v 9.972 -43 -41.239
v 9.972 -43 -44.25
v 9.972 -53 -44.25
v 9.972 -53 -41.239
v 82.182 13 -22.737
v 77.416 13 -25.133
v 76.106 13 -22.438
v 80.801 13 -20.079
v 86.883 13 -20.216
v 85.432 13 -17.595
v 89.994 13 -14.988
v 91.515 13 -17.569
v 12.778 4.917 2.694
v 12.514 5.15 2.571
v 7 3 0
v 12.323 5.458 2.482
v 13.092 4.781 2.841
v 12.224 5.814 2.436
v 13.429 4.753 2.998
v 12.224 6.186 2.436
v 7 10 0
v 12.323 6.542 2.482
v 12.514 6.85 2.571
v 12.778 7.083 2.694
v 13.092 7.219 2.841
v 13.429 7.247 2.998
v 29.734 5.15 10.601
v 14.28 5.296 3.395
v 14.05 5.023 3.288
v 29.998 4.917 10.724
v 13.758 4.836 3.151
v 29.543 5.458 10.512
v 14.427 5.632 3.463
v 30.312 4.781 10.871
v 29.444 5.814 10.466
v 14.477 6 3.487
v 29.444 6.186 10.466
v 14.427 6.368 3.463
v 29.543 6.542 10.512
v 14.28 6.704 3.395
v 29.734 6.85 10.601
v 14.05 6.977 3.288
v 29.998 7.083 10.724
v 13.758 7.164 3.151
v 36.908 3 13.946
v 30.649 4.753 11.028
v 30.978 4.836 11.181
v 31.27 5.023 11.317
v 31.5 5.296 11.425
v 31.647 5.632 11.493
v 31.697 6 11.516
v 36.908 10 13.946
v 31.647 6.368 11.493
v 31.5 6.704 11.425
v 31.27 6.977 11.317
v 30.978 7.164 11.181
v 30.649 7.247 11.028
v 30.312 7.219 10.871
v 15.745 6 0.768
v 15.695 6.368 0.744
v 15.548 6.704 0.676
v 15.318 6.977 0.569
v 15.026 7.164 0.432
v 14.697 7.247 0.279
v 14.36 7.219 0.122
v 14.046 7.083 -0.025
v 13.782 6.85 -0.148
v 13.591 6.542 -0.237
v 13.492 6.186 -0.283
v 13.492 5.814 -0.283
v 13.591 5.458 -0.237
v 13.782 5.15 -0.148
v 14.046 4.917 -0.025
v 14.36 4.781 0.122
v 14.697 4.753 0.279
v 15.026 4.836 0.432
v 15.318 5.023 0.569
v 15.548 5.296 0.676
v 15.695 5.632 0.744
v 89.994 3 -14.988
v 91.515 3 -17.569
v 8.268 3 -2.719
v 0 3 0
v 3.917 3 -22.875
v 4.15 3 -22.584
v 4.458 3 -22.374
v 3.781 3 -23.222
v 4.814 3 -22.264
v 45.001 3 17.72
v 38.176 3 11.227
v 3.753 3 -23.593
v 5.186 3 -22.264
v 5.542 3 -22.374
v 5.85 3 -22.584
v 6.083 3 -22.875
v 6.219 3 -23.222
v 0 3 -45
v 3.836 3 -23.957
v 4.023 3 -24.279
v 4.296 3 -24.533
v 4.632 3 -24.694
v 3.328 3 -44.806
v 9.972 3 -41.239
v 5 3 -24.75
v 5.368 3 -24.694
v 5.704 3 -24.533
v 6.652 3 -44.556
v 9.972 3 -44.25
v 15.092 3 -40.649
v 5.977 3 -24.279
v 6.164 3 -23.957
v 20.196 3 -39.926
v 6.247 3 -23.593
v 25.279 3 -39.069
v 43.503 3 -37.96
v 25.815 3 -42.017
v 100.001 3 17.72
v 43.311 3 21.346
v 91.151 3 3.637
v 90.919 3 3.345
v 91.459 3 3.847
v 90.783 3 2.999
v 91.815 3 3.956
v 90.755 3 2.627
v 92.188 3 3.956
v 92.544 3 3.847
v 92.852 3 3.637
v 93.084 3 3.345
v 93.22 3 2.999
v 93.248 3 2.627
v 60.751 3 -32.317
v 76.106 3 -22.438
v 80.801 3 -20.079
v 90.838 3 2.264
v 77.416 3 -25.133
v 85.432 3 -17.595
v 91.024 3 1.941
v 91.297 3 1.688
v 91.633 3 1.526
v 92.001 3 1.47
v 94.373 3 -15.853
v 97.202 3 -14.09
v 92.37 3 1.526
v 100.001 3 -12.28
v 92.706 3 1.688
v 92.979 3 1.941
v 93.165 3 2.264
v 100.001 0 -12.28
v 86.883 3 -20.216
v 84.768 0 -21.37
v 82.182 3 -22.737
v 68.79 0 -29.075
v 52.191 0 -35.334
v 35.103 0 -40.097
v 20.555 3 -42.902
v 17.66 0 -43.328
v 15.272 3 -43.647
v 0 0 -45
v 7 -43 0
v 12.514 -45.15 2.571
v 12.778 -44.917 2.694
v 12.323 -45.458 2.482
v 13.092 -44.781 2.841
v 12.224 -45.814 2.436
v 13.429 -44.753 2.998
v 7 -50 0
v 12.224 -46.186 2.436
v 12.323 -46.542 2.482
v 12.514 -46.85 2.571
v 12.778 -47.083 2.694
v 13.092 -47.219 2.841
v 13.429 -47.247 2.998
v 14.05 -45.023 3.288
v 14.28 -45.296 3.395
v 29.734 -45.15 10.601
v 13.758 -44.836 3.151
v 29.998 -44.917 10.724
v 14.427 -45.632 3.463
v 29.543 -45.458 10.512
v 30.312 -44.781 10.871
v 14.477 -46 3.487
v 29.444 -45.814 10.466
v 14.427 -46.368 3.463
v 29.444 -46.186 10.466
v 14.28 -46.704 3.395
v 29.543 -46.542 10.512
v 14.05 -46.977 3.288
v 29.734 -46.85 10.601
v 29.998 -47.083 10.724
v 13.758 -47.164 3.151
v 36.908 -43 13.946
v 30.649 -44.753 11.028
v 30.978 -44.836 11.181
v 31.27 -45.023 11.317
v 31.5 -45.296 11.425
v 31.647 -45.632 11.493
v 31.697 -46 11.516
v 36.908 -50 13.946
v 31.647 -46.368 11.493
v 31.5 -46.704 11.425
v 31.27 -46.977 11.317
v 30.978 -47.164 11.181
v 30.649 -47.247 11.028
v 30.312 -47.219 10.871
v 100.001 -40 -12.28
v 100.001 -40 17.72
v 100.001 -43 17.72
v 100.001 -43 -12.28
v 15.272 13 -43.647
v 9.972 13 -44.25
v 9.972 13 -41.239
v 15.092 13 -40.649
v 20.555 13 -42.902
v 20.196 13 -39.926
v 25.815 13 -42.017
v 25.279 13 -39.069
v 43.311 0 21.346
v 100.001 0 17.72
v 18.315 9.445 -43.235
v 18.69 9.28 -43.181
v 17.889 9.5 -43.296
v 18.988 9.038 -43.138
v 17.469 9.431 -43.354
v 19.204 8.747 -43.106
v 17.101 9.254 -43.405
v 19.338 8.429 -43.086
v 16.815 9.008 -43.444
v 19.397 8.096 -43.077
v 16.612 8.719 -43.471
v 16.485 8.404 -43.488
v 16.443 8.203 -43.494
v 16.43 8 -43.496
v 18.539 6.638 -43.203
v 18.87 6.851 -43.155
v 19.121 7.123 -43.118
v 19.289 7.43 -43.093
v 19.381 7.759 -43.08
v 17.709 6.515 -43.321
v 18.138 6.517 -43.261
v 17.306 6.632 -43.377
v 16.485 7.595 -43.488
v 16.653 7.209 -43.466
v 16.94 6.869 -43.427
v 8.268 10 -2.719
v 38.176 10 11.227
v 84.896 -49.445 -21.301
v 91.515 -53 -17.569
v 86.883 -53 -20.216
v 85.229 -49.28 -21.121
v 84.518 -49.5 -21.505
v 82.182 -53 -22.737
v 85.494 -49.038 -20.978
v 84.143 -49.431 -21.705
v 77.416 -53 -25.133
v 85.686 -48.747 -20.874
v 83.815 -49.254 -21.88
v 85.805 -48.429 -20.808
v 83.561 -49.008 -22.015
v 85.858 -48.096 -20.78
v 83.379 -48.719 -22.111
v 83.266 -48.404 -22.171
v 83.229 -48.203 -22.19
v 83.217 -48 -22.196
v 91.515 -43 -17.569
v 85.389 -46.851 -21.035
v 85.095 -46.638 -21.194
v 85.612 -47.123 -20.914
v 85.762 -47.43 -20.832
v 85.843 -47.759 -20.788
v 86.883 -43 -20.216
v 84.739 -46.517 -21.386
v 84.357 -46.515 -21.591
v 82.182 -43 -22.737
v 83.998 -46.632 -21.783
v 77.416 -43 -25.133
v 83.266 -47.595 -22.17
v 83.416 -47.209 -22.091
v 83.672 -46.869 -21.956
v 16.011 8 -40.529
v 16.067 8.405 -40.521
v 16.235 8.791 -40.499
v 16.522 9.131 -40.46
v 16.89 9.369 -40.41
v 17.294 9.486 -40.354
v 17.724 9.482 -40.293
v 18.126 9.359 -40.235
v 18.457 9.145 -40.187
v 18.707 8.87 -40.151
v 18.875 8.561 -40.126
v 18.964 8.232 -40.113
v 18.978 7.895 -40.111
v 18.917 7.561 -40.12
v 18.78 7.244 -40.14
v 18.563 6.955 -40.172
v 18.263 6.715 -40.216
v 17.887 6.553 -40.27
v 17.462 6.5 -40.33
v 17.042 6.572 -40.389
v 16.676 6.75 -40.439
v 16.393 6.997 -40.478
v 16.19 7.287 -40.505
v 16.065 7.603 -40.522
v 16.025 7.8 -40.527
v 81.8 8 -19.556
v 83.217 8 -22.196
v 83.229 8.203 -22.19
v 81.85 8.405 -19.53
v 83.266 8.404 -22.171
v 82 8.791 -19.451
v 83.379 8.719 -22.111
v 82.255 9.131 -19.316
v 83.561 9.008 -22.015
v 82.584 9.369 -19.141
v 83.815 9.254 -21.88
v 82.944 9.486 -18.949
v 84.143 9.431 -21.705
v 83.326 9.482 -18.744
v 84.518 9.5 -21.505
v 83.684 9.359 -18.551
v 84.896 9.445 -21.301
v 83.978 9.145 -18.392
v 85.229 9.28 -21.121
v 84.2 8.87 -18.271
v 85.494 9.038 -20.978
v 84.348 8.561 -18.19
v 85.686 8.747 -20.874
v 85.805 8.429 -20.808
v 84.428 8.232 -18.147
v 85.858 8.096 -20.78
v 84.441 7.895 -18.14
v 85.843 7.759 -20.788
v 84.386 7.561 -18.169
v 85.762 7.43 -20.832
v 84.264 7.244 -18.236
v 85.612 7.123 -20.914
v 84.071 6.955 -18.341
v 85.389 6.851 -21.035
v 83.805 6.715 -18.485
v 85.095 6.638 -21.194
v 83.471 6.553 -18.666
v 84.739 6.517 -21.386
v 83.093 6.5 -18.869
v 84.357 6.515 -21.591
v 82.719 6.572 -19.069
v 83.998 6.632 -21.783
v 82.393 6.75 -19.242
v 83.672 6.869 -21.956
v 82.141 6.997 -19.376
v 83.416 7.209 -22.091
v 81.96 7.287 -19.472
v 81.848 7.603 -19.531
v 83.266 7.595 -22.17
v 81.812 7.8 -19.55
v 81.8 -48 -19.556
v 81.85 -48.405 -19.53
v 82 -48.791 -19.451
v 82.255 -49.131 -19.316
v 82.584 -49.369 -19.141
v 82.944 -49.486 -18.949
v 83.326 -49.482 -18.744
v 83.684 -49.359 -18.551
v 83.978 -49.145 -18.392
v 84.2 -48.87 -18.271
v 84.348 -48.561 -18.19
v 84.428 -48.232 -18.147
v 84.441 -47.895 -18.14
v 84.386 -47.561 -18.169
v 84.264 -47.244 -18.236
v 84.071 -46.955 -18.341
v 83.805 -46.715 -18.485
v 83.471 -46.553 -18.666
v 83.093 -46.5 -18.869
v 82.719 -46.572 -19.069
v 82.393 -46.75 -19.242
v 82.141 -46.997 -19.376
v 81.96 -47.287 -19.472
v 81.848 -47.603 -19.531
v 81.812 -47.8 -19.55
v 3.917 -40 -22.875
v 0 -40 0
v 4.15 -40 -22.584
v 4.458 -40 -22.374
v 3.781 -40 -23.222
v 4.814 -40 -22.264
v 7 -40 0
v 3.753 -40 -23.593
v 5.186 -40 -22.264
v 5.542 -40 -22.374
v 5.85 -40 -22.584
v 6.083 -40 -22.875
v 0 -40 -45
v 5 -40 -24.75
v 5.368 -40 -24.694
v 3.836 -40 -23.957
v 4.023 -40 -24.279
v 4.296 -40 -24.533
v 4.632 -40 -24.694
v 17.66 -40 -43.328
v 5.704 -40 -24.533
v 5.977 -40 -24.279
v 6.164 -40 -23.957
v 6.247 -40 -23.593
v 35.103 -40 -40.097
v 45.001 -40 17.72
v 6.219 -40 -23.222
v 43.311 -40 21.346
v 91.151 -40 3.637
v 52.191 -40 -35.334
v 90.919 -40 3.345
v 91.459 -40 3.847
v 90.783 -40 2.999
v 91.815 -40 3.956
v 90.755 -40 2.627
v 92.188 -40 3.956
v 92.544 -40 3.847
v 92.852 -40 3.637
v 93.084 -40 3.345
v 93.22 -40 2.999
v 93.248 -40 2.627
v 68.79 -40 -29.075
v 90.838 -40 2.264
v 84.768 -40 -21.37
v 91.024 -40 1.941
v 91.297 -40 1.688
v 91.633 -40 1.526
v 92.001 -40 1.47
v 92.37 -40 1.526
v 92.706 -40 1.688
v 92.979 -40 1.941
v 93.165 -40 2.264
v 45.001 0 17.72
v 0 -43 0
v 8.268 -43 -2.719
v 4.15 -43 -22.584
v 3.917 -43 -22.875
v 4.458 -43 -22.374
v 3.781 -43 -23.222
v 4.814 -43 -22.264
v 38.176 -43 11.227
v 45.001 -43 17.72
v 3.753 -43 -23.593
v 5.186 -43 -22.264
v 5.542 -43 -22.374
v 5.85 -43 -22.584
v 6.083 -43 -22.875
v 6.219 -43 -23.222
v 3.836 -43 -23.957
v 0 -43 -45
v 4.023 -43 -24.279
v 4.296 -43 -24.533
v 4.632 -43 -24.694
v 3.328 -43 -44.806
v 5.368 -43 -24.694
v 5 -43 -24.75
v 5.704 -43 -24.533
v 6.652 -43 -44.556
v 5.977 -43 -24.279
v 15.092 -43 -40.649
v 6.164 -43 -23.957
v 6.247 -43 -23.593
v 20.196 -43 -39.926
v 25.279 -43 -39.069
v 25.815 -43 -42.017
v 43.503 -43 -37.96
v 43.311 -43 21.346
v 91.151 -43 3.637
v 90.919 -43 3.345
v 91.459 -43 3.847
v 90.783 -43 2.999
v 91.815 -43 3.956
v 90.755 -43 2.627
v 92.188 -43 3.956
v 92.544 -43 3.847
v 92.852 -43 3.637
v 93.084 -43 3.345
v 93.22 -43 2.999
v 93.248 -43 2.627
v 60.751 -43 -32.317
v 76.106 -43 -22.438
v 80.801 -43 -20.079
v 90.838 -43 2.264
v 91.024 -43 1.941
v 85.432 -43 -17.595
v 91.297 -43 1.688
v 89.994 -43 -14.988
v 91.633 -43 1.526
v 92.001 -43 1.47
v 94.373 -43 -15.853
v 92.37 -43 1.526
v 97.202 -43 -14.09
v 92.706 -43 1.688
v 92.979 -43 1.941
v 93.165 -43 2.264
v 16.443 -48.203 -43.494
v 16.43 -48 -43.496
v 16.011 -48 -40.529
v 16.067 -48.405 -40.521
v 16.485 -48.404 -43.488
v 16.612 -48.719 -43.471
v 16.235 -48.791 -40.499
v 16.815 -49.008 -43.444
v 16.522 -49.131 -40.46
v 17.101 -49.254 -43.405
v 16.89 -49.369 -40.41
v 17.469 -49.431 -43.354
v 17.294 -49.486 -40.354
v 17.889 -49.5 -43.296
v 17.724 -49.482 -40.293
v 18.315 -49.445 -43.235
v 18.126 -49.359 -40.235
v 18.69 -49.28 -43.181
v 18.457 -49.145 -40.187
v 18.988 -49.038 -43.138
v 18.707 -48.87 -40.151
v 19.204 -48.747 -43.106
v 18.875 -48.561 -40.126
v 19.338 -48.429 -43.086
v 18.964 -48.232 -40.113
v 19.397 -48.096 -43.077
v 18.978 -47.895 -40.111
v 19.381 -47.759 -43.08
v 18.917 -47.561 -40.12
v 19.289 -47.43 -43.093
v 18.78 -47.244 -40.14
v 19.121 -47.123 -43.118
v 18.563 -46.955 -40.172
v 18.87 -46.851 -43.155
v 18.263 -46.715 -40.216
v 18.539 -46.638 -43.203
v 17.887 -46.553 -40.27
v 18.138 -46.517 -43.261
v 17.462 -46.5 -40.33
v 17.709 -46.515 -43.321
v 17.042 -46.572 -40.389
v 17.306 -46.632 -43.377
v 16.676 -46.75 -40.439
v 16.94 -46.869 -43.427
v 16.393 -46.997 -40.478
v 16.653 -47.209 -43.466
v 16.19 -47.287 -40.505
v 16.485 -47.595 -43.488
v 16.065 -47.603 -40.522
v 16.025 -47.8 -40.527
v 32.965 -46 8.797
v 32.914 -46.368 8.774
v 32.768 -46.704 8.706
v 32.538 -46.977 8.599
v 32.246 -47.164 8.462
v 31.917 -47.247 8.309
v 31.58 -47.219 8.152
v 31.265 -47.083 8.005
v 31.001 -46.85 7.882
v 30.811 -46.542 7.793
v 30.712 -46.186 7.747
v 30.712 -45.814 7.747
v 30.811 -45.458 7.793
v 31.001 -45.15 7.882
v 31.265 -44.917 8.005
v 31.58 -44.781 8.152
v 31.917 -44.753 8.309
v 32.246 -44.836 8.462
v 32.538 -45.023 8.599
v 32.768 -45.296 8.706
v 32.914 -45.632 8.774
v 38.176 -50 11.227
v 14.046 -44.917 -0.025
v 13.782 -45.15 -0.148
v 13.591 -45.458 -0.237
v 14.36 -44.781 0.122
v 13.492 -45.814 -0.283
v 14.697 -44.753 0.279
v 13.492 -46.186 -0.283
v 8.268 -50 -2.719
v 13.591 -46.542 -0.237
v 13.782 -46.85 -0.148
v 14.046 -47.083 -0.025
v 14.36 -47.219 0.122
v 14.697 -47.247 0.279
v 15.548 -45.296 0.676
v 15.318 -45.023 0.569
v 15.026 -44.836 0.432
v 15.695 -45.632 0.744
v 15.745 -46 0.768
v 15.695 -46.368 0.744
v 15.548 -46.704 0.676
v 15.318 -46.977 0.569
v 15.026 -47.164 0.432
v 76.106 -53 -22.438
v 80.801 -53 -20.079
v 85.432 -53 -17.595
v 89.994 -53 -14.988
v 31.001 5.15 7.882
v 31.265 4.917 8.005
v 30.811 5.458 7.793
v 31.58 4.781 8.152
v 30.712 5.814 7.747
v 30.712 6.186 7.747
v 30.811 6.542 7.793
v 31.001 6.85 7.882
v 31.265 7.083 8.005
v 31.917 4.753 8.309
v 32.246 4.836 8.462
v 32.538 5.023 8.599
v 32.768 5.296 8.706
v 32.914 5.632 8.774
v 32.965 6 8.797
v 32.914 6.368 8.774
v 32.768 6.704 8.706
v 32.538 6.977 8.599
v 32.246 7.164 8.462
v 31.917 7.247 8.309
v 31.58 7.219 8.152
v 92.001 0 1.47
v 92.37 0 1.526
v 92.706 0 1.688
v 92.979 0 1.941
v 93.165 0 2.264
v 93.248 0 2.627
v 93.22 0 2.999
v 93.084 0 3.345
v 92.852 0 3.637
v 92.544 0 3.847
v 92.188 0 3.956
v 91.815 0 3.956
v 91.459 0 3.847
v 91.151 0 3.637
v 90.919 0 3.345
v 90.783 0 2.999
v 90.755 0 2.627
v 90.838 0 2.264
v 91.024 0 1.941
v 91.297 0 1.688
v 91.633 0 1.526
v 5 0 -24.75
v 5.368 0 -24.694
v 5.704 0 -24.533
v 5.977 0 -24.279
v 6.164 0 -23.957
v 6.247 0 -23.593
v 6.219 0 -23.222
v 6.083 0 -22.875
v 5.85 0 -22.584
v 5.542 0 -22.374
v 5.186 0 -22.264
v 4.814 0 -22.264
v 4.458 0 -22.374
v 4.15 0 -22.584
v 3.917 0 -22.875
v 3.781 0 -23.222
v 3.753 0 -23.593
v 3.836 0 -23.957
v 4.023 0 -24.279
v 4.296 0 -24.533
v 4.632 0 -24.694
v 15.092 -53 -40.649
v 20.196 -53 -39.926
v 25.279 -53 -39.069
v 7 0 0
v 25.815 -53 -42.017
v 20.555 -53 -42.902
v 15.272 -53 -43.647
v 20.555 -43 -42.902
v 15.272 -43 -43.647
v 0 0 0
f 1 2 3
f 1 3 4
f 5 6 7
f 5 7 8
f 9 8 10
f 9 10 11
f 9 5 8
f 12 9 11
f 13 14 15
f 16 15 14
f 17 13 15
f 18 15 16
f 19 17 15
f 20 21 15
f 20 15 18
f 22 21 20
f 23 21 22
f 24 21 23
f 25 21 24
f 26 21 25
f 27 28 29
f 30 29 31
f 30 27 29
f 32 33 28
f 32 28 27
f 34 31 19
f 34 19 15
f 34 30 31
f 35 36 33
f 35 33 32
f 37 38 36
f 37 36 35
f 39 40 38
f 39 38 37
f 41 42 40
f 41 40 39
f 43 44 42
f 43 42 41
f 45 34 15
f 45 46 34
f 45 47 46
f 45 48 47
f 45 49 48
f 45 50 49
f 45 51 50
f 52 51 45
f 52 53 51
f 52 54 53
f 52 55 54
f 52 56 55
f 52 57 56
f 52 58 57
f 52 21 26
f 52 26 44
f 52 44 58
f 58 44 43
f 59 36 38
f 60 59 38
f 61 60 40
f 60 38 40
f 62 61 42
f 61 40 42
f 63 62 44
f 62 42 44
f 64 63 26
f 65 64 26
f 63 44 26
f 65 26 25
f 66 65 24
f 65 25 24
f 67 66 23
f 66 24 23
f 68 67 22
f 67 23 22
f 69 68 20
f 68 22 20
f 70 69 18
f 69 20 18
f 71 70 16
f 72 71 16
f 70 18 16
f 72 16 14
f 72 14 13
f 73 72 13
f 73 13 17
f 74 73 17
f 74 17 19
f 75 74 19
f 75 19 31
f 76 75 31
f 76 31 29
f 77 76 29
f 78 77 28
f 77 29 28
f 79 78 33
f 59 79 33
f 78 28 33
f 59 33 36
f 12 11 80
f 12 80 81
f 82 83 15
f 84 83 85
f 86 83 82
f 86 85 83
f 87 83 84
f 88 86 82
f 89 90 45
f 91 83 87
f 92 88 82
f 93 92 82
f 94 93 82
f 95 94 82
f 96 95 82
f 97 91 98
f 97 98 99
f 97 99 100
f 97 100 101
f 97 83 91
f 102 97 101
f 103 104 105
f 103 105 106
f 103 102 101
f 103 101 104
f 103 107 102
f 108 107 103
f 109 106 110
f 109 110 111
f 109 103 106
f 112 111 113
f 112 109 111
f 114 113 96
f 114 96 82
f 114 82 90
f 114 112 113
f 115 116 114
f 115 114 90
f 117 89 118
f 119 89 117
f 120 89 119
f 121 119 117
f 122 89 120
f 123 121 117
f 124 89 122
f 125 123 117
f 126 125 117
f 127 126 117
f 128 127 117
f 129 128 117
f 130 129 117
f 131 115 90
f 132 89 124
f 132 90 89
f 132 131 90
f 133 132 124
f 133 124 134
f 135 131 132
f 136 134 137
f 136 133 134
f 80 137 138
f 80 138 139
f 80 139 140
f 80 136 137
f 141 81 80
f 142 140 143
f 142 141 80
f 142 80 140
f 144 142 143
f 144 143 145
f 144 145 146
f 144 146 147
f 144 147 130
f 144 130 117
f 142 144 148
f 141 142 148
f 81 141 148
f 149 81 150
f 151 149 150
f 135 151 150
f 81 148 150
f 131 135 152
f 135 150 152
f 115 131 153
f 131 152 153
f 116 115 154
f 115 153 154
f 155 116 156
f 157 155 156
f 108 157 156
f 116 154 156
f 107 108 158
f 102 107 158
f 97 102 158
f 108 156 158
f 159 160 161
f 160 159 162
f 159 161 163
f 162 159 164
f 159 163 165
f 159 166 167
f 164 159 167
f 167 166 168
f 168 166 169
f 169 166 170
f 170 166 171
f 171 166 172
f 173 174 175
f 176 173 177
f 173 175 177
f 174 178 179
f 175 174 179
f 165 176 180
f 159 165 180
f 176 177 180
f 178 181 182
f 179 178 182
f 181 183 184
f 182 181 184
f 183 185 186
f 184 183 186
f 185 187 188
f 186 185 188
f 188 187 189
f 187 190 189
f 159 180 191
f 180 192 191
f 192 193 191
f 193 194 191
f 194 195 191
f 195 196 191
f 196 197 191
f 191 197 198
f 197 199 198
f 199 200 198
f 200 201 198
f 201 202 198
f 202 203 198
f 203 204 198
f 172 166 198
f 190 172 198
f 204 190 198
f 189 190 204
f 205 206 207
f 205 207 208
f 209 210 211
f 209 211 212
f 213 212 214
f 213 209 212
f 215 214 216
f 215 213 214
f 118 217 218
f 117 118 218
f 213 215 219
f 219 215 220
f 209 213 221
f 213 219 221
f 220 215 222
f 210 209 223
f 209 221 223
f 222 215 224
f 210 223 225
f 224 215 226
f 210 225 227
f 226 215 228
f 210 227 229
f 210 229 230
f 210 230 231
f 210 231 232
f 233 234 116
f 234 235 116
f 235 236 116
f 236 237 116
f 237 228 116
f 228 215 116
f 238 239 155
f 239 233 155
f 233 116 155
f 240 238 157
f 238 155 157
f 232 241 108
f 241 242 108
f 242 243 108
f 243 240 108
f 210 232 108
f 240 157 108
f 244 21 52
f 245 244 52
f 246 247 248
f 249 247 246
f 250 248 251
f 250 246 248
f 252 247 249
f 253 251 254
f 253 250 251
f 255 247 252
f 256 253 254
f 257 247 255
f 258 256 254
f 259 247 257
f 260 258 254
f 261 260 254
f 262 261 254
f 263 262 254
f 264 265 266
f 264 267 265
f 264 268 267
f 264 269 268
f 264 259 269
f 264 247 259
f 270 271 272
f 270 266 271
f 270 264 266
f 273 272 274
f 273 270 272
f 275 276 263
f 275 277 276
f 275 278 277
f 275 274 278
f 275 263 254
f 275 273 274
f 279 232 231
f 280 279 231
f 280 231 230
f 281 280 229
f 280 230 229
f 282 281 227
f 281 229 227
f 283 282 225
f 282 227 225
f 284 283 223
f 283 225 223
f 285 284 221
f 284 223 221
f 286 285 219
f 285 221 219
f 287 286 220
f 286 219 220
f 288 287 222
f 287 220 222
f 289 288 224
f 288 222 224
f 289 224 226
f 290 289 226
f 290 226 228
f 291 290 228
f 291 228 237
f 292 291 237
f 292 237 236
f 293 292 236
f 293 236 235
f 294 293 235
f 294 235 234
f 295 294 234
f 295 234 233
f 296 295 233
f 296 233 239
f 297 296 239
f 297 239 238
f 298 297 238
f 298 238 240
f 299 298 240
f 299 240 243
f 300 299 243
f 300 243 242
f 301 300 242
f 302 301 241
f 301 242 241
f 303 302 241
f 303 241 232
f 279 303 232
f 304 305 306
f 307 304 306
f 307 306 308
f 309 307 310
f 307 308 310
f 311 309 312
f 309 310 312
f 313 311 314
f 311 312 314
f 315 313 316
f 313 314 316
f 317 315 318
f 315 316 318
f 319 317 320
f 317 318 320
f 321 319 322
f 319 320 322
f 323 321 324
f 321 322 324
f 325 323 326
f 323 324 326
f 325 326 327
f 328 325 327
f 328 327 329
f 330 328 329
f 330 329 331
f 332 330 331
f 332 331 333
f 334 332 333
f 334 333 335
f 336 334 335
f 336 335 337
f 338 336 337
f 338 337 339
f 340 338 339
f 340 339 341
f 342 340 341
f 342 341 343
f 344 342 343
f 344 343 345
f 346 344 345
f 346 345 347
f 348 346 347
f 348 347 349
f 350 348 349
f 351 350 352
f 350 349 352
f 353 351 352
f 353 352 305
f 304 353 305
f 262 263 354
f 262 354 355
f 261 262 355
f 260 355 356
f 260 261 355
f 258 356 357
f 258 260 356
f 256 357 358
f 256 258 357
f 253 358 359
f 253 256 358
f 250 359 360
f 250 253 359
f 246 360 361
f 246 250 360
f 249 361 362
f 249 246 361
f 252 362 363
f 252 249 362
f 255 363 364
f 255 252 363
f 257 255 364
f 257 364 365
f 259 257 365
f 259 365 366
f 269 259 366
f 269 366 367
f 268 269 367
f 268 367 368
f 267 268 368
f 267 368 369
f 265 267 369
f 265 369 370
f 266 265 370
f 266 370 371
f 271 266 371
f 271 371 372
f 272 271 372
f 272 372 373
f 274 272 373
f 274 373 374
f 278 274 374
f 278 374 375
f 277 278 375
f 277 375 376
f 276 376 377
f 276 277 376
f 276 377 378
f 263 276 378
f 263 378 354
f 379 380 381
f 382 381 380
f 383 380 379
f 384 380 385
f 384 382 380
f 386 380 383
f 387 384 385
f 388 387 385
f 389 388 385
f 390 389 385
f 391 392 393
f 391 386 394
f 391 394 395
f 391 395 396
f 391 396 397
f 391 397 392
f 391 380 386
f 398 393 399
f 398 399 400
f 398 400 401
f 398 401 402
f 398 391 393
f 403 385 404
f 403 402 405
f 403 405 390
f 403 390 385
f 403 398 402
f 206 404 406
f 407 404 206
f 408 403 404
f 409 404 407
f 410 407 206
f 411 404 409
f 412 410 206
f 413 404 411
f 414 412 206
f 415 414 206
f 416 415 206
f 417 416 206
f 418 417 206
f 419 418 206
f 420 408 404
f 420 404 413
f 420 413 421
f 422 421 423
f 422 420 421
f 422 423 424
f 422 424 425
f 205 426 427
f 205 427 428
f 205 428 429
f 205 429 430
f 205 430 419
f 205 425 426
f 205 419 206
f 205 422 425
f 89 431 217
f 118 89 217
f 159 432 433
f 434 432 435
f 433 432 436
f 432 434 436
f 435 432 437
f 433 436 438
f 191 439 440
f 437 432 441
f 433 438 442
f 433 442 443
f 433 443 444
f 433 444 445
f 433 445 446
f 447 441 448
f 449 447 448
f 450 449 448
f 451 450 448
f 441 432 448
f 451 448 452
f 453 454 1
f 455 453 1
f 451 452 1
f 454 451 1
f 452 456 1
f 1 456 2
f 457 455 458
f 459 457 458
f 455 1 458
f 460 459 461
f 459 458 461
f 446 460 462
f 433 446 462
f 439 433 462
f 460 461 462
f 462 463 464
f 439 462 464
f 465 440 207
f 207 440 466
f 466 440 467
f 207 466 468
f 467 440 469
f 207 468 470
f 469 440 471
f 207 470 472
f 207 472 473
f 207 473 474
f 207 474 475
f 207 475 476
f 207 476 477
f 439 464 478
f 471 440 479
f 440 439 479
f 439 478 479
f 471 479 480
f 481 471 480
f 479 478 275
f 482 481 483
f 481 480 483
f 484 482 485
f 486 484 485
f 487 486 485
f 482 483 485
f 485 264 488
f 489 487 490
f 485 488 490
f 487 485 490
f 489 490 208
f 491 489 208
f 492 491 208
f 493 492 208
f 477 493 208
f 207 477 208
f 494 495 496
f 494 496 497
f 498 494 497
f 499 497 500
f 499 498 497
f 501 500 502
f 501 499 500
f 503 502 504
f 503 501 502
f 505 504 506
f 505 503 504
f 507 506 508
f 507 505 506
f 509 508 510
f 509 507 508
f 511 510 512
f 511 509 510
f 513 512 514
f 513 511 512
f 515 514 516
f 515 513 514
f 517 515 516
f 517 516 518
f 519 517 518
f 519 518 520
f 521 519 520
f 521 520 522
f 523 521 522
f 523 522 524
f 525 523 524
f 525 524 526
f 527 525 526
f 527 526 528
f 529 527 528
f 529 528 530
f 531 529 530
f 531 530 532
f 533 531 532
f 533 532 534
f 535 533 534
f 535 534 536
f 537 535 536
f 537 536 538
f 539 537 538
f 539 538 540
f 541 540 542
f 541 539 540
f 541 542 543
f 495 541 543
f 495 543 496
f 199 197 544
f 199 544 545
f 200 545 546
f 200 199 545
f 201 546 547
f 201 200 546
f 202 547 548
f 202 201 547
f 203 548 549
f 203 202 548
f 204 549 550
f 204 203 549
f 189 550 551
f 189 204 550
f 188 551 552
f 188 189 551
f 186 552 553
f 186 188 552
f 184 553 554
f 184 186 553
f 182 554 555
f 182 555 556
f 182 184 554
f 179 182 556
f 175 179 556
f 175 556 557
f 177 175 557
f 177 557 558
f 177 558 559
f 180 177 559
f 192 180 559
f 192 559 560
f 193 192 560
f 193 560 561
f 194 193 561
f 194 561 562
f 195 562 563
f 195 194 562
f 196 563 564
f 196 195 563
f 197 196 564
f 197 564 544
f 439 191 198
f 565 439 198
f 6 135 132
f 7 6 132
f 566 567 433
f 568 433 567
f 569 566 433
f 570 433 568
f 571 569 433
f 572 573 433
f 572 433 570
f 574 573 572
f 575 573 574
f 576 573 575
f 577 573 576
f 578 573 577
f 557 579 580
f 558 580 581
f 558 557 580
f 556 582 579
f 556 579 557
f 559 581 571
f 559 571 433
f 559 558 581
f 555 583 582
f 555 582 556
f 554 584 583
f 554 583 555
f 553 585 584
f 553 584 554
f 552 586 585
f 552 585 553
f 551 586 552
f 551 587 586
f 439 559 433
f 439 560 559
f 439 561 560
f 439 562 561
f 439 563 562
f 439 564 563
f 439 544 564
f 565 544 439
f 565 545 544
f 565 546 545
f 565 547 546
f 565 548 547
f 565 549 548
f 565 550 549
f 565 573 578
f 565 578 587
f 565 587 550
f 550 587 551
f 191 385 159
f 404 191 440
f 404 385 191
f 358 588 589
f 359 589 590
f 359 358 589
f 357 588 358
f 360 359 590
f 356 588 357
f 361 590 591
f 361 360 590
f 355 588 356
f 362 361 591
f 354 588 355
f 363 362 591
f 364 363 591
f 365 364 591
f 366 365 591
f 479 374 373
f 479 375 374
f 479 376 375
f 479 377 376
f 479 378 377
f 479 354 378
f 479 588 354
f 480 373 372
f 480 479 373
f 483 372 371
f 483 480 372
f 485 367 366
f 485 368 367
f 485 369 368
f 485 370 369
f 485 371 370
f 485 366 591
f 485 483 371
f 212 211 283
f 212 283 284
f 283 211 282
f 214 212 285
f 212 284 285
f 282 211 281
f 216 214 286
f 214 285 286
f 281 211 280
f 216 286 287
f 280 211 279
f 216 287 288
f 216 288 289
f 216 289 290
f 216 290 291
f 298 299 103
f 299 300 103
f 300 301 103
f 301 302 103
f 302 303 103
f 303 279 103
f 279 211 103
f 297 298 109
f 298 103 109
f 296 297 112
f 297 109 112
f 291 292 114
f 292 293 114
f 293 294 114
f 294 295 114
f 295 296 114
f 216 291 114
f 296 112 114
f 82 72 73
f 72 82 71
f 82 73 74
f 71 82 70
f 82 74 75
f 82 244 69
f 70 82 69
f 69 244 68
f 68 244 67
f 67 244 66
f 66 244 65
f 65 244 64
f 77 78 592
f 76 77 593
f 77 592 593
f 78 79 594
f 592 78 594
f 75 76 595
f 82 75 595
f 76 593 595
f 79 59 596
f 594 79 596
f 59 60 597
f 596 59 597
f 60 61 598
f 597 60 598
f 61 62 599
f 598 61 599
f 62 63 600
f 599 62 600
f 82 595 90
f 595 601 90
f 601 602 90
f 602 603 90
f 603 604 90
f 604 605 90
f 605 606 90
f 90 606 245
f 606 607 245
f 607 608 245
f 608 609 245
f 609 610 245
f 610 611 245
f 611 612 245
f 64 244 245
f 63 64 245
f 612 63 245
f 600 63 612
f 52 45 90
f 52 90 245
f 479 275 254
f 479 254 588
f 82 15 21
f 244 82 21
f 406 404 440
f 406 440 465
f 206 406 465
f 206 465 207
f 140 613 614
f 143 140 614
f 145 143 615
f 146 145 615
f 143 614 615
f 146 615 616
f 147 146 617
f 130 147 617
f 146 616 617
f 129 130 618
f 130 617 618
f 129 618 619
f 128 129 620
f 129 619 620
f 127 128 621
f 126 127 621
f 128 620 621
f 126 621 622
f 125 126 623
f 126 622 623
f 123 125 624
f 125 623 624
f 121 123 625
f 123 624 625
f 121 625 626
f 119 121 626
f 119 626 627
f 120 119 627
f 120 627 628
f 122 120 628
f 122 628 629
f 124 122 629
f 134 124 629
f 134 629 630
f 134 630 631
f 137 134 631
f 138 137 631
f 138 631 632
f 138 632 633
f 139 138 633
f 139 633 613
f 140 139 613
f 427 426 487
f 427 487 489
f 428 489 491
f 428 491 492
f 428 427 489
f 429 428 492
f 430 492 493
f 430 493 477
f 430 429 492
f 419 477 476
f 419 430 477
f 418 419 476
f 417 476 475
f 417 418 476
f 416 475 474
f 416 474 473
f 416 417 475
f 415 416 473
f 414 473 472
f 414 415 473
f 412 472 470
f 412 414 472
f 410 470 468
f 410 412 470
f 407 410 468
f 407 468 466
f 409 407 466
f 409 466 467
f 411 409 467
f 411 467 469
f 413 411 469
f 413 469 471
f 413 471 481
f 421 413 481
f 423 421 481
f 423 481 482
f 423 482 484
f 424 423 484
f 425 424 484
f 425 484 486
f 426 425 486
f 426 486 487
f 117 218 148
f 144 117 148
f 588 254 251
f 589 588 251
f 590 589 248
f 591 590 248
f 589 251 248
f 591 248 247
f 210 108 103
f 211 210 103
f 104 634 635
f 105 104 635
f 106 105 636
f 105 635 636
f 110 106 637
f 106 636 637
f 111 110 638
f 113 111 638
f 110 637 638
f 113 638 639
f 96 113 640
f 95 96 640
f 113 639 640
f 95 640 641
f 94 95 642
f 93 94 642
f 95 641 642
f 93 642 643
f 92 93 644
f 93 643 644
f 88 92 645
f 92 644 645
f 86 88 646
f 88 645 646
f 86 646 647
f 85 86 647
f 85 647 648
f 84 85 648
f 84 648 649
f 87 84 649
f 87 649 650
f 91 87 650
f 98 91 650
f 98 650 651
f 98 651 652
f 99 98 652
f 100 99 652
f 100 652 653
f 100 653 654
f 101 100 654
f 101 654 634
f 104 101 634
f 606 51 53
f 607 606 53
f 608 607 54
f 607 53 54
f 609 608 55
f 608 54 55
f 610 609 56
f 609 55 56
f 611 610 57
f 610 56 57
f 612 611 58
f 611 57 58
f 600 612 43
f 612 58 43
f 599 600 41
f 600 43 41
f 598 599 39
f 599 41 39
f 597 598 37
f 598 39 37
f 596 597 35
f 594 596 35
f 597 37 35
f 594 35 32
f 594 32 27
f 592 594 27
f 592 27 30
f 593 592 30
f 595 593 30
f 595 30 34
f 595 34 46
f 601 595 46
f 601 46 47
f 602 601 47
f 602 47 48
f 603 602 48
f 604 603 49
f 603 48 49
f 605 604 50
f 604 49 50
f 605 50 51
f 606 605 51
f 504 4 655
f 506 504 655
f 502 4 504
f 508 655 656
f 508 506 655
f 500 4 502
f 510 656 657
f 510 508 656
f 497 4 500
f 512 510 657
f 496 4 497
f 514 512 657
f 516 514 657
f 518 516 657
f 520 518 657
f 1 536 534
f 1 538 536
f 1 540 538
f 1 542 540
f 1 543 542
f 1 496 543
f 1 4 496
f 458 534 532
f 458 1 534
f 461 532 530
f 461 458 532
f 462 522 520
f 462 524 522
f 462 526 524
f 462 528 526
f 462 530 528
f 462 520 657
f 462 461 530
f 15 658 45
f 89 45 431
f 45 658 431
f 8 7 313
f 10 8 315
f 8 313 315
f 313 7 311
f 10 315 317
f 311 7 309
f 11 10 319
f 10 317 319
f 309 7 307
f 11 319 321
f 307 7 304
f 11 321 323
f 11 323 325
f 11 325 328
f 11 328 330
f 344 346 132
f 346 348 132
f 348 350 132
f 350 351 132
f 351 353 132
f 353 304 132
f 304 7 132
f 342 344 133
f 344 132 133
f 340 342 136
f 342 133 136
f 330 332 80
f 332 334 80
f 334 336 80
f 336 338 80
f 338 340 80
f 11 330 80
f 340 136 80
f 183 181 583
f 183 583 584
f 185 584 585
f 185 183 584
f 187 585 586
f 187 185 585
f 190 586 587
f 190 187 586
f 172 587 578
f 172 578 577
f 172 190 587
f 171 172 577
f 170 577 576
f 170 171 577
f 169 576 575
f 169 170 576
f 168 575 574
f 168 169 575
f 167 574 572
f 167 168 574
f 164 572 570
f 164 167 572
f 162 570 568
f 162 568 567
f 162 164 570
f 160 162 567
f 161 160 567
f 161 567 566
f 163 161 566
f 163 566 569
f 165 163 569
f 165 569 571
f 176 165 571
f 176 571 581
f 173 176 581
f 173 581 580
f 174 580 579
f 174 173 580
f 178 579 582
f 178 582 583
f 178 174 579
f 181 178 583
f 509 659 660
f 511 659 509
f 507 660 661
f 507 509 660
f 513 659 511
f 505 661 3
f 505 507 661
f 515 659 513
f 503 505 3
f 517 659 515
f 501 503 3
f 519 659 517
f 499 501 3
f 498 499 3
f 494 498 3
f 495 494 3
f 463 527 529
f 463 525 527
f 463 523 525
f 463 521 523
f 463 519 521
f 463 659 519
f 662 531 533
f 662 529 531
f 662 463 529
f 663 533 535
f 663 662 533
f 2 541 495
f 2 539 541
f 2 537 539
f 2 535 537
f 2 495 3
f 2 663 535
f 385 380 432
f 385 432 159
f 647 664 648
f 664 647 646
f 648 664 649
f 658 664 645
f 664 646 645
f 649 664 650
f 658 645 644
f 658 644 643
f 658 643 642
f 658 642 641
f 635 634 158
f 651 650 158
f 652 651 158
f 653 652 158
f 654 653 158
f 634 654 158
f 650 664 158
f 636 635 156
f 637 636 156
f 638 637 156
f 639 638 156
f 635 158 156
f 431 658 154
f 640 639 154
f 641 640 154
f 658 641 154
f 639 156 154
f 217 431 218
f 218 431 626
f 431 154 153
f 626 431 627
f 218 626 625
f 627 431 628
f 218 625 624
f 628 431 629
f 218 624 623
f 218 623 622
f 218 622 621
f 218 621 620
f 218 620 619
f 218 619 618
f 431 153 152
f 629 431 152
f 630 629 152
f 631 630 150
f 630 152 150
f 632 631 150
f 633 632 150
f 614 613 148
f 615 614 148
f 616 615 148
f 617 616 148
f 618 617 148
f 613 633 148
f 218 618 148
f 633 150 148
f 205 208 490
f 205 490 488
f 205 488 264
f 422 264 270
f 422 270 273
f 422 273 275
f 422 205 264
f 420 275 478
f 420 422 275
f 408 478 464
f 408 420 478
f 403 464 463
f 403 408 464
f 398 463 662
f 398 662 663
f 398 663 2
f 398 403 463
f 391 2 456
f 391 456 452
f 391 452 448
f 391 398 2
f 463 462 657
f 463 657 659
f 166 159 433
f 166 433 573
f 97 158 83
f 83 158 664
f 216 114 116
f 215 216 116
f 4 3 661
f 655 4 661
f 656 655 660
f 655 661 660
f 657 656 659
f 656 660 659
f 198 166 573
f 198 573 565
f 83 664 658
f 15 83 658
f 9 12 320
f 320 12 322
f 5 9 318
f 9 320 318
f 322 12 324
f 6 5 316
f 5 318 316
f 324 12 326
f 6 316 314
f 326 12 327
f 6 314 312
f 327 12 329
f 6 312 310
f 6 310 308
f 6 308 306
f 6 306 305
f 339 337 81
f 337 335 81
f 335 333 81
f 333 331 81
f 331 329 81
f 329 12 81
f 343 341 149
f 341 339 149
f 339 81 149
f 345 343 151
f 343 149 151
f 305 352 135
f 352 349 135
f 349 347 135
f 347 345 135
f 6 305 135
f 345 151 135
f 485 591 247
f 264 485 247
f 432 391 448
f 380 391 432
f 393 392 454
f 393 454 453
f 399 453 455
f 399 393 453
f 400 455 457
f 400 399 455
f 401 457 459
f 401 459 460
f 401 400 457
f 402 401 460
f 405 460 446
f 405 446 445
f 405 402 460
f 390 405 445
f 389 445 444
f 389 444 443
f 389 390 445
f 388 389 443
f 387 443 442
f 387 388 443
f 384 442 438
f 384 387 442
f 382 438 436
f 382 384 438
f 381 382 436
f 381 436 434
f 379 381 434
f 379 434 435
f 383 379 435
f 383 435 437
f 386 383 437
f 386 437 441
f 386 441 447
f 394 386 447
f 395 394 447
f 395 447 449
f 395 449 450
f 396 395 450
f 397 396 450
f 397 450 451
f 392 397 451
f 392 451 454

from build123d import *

# Parameters (mm, degrees)
BOSS_EXTRUDE1_DEPTH     = 3
SKETCH2_W               = 33
SKETCH2_H               = 10
SKETCH2_R               = 1.25
BOSS_EXTRUDE2_DEPTH     = 3
SKETCH3_R               = 1.25
CUT_EXTRUDE1_DEPTH      = 111.114926801
BOSS_EXTRUDE3_DEPTH     = 10
CUT_EXTRUDE2_REACH      = 107.286
CUT_EXTRUDE2_END_RADIUS = 197.003812576
SKETCH8_R               = 1.5
CUT_EXTRUDE3_REACH      = 97.662
CUT_EXTRUDE3_END_RADIUS = 197.003812576
SKETCH9_R               = 1.5


with BuildPart() as part:
    # Sketch1 → Boss-Extrude1 (new body)
    with BuildSketch(Plane(origin=(0, 0, 0), x_dir=(1, 0, 0), z_dir=(0, 1, 0))):
        with BuildLine():
            Line((0, 45), (0, 0))
            Line((0, 0), (7, 0))
            Line((7, 0), (45.00148551, -17.720383715))
            Line((45.00148551, -17.720383715), (43.311012463, -21.345614863))
            Line((43.311012463, -21.345614863), (100.00148551, -17.720383715))
            Line((100.00148551, -17.720383715), (100.00148551, 12.279616285))
            ThreePointArc((100.00148551, 12.279616285), (52.191052923, 35.333931061), (0, 45))
        make_face()
    extrude(amount=BOSS_EXTRUDE1_DEPTH)

    # Sketch2 → Boss-Extrude2 (add)
    with BuildSketch(Plane(origin=(1.250243366, 0, -2.681155551), x_dir=(0.9063077870366495, 0, 0.42261826174070033), z_dir=(-0.42261826174070033, 0, 0.9063077870366495))):
        with Locations((22.844154509, 5)):
            Rectangle(SKETCH2_W, SKETCH2_H)
        with Locations((13.344154509, 6)):
            Circle(SKETCH2_R, mode=Mode.SUBTRACT)
        with Locations((32.344154509, 6)):
            Circle(SKETCH2_R, mode=Mode.SUBTRACT)
    extrude(amount=-BOSS_EXTRUDE2_DEPTH)

    # Sketch3 → Cut-Extrude1 (cut, through all)
    with BuildSketch(Plane.XZ):
        with Locations(Location((5, -23.5, 0), (0, 0, 270))):
            Circle(SKETCH3_R)
        with Locations(Location((92.00148551, 2.720383715, 0), (0, 0, 270))):
            Circle(SKETCH3_R)
    extrude(amount=-CUT_EXTRUDE1_DEPTH, mode=Mode.SUBTRACT)

    # Sketch6 → Boss-Extrude3 (add)
    with BuildSketch(Plane(origin=(0, 3, 0), x_dir=(1, 0, 0), z_dir=(0, 1, 0))):
        with BuildLine():
            ThreePointArc((25.815183319, 42.016667614), (17.915864182, 43.291962745), (9.971855225, 44.250264466))
            Line((9.971855225, 44.250264466), (9.971855225, 41.238788581))
            ThreePointArc((9.971855225, 41.238788581), (17.646509134, 40.304062324), (25.278576941, 39.068923955))
            Line((25.278576941, 39.068923955), (25.815183319, 42.016667614))
        make_face()
        with BuildLine():
            ThreePointArc((91.515126037, 17.56938971), (84.541117021, 21.492248202), (77.415775106, 25.13300679))
            Line((77.415775106, 25.13300679), (76.106143507, 22.438196193))
            ThreePointArc((76.106143507, 22.438196193), (83.124741123, 18.85197958), (89.994272948, 14.987889185))
            Line((89.994272948, 14.987889185), (91.515126037, 17.56938971))
        make_face()
    extrude(amount=BOSS_EXTRUDE3_DEPTH)

    # Cut-Extrude2: up to this cylinder (the profile starts outside it)
    cut_extrude2_end = Plane(origin=(-10.004096478, 8, 154.749638432), z_dir=(0, -1, 0)) * Cylinder(CUT_EXTRUDE2_END_RADIUS, 609.579625152, mode=Mode.PRIVATE)
    # Sketch8 → Cut-Extrude2 (cut, up to the surface)
    with BuildSketch(Plane(origin=(17.915864182, 13, -43.291962745), x_dir=(-0.9902080058846243, 0, -0.1395998033021389), z_dir=(0.1395998033021389, 0, -0.9902080058846243)), mode=Mode.PRIVATE) as cut_extrude2_sk1:
        with Locations((0, -5)):
            Circle(SKETCH8_R)
    cut_extrude2_tool1 = extrude(cut_extrude2_sk1.sketch, amount=-CUT_EXTRUDE2_REACH, mode=Mode.PRIVATE) - cut_extrude2_end
    add(cut_extrude2_tool1.solids().sort_by_distance((17.915864, 8, -43.291963))[0], mode=Mode.SUBTRACT)

    # Cut-Extrude3: up to this cylinder (the profile starts outside it)
    cut_extrude3_end = Plane(origin=(-10.004096478, 8, 154.749638432), z_dir=(0, -1, 0)) * Cylinder(CUT_EXTRUDE3_END_RADIUS, 590.331625152, mode=Mode.PRIVATE)
    # Sketch9 → Cut-Extrude3 (cut, up to the surface)
    with BuildSketch(Plane(origin=(84.541117021, 13, -21.492248202), x_dir=(-0.8812094331704029, 0, -0.47272606749733775), z_dir=(0.47272606749733775, 0, -0.8812094331704029)), mode=Mode.PRIVATE) as cut_extrude3_sk1:
        with Locations((0, -5)):
            Circle(SKETCH9_R)
    cut_extrude3_tool1 = extrude(cut_extrude3_sk1.sketch, amount=-CUT_EXTRUDE3_REACH, mode=Mode.PRIVATE) - cut_extrude3_end
    add(cut_extrude3_tool1.solids().sort_by_distance((84.541117, 8, -21.492248))[0], mode=Mode.SUBTRACT)


with BuildPart() as body_2:
    # Mirror1: mirrored copy
    add(part.part.mirror(Plane(origin=(0, -20, 0), x_dir=(0, 0, 1), z_dir=(0, -1, 0))))


solid = Compound([part.part, body_2.part])
